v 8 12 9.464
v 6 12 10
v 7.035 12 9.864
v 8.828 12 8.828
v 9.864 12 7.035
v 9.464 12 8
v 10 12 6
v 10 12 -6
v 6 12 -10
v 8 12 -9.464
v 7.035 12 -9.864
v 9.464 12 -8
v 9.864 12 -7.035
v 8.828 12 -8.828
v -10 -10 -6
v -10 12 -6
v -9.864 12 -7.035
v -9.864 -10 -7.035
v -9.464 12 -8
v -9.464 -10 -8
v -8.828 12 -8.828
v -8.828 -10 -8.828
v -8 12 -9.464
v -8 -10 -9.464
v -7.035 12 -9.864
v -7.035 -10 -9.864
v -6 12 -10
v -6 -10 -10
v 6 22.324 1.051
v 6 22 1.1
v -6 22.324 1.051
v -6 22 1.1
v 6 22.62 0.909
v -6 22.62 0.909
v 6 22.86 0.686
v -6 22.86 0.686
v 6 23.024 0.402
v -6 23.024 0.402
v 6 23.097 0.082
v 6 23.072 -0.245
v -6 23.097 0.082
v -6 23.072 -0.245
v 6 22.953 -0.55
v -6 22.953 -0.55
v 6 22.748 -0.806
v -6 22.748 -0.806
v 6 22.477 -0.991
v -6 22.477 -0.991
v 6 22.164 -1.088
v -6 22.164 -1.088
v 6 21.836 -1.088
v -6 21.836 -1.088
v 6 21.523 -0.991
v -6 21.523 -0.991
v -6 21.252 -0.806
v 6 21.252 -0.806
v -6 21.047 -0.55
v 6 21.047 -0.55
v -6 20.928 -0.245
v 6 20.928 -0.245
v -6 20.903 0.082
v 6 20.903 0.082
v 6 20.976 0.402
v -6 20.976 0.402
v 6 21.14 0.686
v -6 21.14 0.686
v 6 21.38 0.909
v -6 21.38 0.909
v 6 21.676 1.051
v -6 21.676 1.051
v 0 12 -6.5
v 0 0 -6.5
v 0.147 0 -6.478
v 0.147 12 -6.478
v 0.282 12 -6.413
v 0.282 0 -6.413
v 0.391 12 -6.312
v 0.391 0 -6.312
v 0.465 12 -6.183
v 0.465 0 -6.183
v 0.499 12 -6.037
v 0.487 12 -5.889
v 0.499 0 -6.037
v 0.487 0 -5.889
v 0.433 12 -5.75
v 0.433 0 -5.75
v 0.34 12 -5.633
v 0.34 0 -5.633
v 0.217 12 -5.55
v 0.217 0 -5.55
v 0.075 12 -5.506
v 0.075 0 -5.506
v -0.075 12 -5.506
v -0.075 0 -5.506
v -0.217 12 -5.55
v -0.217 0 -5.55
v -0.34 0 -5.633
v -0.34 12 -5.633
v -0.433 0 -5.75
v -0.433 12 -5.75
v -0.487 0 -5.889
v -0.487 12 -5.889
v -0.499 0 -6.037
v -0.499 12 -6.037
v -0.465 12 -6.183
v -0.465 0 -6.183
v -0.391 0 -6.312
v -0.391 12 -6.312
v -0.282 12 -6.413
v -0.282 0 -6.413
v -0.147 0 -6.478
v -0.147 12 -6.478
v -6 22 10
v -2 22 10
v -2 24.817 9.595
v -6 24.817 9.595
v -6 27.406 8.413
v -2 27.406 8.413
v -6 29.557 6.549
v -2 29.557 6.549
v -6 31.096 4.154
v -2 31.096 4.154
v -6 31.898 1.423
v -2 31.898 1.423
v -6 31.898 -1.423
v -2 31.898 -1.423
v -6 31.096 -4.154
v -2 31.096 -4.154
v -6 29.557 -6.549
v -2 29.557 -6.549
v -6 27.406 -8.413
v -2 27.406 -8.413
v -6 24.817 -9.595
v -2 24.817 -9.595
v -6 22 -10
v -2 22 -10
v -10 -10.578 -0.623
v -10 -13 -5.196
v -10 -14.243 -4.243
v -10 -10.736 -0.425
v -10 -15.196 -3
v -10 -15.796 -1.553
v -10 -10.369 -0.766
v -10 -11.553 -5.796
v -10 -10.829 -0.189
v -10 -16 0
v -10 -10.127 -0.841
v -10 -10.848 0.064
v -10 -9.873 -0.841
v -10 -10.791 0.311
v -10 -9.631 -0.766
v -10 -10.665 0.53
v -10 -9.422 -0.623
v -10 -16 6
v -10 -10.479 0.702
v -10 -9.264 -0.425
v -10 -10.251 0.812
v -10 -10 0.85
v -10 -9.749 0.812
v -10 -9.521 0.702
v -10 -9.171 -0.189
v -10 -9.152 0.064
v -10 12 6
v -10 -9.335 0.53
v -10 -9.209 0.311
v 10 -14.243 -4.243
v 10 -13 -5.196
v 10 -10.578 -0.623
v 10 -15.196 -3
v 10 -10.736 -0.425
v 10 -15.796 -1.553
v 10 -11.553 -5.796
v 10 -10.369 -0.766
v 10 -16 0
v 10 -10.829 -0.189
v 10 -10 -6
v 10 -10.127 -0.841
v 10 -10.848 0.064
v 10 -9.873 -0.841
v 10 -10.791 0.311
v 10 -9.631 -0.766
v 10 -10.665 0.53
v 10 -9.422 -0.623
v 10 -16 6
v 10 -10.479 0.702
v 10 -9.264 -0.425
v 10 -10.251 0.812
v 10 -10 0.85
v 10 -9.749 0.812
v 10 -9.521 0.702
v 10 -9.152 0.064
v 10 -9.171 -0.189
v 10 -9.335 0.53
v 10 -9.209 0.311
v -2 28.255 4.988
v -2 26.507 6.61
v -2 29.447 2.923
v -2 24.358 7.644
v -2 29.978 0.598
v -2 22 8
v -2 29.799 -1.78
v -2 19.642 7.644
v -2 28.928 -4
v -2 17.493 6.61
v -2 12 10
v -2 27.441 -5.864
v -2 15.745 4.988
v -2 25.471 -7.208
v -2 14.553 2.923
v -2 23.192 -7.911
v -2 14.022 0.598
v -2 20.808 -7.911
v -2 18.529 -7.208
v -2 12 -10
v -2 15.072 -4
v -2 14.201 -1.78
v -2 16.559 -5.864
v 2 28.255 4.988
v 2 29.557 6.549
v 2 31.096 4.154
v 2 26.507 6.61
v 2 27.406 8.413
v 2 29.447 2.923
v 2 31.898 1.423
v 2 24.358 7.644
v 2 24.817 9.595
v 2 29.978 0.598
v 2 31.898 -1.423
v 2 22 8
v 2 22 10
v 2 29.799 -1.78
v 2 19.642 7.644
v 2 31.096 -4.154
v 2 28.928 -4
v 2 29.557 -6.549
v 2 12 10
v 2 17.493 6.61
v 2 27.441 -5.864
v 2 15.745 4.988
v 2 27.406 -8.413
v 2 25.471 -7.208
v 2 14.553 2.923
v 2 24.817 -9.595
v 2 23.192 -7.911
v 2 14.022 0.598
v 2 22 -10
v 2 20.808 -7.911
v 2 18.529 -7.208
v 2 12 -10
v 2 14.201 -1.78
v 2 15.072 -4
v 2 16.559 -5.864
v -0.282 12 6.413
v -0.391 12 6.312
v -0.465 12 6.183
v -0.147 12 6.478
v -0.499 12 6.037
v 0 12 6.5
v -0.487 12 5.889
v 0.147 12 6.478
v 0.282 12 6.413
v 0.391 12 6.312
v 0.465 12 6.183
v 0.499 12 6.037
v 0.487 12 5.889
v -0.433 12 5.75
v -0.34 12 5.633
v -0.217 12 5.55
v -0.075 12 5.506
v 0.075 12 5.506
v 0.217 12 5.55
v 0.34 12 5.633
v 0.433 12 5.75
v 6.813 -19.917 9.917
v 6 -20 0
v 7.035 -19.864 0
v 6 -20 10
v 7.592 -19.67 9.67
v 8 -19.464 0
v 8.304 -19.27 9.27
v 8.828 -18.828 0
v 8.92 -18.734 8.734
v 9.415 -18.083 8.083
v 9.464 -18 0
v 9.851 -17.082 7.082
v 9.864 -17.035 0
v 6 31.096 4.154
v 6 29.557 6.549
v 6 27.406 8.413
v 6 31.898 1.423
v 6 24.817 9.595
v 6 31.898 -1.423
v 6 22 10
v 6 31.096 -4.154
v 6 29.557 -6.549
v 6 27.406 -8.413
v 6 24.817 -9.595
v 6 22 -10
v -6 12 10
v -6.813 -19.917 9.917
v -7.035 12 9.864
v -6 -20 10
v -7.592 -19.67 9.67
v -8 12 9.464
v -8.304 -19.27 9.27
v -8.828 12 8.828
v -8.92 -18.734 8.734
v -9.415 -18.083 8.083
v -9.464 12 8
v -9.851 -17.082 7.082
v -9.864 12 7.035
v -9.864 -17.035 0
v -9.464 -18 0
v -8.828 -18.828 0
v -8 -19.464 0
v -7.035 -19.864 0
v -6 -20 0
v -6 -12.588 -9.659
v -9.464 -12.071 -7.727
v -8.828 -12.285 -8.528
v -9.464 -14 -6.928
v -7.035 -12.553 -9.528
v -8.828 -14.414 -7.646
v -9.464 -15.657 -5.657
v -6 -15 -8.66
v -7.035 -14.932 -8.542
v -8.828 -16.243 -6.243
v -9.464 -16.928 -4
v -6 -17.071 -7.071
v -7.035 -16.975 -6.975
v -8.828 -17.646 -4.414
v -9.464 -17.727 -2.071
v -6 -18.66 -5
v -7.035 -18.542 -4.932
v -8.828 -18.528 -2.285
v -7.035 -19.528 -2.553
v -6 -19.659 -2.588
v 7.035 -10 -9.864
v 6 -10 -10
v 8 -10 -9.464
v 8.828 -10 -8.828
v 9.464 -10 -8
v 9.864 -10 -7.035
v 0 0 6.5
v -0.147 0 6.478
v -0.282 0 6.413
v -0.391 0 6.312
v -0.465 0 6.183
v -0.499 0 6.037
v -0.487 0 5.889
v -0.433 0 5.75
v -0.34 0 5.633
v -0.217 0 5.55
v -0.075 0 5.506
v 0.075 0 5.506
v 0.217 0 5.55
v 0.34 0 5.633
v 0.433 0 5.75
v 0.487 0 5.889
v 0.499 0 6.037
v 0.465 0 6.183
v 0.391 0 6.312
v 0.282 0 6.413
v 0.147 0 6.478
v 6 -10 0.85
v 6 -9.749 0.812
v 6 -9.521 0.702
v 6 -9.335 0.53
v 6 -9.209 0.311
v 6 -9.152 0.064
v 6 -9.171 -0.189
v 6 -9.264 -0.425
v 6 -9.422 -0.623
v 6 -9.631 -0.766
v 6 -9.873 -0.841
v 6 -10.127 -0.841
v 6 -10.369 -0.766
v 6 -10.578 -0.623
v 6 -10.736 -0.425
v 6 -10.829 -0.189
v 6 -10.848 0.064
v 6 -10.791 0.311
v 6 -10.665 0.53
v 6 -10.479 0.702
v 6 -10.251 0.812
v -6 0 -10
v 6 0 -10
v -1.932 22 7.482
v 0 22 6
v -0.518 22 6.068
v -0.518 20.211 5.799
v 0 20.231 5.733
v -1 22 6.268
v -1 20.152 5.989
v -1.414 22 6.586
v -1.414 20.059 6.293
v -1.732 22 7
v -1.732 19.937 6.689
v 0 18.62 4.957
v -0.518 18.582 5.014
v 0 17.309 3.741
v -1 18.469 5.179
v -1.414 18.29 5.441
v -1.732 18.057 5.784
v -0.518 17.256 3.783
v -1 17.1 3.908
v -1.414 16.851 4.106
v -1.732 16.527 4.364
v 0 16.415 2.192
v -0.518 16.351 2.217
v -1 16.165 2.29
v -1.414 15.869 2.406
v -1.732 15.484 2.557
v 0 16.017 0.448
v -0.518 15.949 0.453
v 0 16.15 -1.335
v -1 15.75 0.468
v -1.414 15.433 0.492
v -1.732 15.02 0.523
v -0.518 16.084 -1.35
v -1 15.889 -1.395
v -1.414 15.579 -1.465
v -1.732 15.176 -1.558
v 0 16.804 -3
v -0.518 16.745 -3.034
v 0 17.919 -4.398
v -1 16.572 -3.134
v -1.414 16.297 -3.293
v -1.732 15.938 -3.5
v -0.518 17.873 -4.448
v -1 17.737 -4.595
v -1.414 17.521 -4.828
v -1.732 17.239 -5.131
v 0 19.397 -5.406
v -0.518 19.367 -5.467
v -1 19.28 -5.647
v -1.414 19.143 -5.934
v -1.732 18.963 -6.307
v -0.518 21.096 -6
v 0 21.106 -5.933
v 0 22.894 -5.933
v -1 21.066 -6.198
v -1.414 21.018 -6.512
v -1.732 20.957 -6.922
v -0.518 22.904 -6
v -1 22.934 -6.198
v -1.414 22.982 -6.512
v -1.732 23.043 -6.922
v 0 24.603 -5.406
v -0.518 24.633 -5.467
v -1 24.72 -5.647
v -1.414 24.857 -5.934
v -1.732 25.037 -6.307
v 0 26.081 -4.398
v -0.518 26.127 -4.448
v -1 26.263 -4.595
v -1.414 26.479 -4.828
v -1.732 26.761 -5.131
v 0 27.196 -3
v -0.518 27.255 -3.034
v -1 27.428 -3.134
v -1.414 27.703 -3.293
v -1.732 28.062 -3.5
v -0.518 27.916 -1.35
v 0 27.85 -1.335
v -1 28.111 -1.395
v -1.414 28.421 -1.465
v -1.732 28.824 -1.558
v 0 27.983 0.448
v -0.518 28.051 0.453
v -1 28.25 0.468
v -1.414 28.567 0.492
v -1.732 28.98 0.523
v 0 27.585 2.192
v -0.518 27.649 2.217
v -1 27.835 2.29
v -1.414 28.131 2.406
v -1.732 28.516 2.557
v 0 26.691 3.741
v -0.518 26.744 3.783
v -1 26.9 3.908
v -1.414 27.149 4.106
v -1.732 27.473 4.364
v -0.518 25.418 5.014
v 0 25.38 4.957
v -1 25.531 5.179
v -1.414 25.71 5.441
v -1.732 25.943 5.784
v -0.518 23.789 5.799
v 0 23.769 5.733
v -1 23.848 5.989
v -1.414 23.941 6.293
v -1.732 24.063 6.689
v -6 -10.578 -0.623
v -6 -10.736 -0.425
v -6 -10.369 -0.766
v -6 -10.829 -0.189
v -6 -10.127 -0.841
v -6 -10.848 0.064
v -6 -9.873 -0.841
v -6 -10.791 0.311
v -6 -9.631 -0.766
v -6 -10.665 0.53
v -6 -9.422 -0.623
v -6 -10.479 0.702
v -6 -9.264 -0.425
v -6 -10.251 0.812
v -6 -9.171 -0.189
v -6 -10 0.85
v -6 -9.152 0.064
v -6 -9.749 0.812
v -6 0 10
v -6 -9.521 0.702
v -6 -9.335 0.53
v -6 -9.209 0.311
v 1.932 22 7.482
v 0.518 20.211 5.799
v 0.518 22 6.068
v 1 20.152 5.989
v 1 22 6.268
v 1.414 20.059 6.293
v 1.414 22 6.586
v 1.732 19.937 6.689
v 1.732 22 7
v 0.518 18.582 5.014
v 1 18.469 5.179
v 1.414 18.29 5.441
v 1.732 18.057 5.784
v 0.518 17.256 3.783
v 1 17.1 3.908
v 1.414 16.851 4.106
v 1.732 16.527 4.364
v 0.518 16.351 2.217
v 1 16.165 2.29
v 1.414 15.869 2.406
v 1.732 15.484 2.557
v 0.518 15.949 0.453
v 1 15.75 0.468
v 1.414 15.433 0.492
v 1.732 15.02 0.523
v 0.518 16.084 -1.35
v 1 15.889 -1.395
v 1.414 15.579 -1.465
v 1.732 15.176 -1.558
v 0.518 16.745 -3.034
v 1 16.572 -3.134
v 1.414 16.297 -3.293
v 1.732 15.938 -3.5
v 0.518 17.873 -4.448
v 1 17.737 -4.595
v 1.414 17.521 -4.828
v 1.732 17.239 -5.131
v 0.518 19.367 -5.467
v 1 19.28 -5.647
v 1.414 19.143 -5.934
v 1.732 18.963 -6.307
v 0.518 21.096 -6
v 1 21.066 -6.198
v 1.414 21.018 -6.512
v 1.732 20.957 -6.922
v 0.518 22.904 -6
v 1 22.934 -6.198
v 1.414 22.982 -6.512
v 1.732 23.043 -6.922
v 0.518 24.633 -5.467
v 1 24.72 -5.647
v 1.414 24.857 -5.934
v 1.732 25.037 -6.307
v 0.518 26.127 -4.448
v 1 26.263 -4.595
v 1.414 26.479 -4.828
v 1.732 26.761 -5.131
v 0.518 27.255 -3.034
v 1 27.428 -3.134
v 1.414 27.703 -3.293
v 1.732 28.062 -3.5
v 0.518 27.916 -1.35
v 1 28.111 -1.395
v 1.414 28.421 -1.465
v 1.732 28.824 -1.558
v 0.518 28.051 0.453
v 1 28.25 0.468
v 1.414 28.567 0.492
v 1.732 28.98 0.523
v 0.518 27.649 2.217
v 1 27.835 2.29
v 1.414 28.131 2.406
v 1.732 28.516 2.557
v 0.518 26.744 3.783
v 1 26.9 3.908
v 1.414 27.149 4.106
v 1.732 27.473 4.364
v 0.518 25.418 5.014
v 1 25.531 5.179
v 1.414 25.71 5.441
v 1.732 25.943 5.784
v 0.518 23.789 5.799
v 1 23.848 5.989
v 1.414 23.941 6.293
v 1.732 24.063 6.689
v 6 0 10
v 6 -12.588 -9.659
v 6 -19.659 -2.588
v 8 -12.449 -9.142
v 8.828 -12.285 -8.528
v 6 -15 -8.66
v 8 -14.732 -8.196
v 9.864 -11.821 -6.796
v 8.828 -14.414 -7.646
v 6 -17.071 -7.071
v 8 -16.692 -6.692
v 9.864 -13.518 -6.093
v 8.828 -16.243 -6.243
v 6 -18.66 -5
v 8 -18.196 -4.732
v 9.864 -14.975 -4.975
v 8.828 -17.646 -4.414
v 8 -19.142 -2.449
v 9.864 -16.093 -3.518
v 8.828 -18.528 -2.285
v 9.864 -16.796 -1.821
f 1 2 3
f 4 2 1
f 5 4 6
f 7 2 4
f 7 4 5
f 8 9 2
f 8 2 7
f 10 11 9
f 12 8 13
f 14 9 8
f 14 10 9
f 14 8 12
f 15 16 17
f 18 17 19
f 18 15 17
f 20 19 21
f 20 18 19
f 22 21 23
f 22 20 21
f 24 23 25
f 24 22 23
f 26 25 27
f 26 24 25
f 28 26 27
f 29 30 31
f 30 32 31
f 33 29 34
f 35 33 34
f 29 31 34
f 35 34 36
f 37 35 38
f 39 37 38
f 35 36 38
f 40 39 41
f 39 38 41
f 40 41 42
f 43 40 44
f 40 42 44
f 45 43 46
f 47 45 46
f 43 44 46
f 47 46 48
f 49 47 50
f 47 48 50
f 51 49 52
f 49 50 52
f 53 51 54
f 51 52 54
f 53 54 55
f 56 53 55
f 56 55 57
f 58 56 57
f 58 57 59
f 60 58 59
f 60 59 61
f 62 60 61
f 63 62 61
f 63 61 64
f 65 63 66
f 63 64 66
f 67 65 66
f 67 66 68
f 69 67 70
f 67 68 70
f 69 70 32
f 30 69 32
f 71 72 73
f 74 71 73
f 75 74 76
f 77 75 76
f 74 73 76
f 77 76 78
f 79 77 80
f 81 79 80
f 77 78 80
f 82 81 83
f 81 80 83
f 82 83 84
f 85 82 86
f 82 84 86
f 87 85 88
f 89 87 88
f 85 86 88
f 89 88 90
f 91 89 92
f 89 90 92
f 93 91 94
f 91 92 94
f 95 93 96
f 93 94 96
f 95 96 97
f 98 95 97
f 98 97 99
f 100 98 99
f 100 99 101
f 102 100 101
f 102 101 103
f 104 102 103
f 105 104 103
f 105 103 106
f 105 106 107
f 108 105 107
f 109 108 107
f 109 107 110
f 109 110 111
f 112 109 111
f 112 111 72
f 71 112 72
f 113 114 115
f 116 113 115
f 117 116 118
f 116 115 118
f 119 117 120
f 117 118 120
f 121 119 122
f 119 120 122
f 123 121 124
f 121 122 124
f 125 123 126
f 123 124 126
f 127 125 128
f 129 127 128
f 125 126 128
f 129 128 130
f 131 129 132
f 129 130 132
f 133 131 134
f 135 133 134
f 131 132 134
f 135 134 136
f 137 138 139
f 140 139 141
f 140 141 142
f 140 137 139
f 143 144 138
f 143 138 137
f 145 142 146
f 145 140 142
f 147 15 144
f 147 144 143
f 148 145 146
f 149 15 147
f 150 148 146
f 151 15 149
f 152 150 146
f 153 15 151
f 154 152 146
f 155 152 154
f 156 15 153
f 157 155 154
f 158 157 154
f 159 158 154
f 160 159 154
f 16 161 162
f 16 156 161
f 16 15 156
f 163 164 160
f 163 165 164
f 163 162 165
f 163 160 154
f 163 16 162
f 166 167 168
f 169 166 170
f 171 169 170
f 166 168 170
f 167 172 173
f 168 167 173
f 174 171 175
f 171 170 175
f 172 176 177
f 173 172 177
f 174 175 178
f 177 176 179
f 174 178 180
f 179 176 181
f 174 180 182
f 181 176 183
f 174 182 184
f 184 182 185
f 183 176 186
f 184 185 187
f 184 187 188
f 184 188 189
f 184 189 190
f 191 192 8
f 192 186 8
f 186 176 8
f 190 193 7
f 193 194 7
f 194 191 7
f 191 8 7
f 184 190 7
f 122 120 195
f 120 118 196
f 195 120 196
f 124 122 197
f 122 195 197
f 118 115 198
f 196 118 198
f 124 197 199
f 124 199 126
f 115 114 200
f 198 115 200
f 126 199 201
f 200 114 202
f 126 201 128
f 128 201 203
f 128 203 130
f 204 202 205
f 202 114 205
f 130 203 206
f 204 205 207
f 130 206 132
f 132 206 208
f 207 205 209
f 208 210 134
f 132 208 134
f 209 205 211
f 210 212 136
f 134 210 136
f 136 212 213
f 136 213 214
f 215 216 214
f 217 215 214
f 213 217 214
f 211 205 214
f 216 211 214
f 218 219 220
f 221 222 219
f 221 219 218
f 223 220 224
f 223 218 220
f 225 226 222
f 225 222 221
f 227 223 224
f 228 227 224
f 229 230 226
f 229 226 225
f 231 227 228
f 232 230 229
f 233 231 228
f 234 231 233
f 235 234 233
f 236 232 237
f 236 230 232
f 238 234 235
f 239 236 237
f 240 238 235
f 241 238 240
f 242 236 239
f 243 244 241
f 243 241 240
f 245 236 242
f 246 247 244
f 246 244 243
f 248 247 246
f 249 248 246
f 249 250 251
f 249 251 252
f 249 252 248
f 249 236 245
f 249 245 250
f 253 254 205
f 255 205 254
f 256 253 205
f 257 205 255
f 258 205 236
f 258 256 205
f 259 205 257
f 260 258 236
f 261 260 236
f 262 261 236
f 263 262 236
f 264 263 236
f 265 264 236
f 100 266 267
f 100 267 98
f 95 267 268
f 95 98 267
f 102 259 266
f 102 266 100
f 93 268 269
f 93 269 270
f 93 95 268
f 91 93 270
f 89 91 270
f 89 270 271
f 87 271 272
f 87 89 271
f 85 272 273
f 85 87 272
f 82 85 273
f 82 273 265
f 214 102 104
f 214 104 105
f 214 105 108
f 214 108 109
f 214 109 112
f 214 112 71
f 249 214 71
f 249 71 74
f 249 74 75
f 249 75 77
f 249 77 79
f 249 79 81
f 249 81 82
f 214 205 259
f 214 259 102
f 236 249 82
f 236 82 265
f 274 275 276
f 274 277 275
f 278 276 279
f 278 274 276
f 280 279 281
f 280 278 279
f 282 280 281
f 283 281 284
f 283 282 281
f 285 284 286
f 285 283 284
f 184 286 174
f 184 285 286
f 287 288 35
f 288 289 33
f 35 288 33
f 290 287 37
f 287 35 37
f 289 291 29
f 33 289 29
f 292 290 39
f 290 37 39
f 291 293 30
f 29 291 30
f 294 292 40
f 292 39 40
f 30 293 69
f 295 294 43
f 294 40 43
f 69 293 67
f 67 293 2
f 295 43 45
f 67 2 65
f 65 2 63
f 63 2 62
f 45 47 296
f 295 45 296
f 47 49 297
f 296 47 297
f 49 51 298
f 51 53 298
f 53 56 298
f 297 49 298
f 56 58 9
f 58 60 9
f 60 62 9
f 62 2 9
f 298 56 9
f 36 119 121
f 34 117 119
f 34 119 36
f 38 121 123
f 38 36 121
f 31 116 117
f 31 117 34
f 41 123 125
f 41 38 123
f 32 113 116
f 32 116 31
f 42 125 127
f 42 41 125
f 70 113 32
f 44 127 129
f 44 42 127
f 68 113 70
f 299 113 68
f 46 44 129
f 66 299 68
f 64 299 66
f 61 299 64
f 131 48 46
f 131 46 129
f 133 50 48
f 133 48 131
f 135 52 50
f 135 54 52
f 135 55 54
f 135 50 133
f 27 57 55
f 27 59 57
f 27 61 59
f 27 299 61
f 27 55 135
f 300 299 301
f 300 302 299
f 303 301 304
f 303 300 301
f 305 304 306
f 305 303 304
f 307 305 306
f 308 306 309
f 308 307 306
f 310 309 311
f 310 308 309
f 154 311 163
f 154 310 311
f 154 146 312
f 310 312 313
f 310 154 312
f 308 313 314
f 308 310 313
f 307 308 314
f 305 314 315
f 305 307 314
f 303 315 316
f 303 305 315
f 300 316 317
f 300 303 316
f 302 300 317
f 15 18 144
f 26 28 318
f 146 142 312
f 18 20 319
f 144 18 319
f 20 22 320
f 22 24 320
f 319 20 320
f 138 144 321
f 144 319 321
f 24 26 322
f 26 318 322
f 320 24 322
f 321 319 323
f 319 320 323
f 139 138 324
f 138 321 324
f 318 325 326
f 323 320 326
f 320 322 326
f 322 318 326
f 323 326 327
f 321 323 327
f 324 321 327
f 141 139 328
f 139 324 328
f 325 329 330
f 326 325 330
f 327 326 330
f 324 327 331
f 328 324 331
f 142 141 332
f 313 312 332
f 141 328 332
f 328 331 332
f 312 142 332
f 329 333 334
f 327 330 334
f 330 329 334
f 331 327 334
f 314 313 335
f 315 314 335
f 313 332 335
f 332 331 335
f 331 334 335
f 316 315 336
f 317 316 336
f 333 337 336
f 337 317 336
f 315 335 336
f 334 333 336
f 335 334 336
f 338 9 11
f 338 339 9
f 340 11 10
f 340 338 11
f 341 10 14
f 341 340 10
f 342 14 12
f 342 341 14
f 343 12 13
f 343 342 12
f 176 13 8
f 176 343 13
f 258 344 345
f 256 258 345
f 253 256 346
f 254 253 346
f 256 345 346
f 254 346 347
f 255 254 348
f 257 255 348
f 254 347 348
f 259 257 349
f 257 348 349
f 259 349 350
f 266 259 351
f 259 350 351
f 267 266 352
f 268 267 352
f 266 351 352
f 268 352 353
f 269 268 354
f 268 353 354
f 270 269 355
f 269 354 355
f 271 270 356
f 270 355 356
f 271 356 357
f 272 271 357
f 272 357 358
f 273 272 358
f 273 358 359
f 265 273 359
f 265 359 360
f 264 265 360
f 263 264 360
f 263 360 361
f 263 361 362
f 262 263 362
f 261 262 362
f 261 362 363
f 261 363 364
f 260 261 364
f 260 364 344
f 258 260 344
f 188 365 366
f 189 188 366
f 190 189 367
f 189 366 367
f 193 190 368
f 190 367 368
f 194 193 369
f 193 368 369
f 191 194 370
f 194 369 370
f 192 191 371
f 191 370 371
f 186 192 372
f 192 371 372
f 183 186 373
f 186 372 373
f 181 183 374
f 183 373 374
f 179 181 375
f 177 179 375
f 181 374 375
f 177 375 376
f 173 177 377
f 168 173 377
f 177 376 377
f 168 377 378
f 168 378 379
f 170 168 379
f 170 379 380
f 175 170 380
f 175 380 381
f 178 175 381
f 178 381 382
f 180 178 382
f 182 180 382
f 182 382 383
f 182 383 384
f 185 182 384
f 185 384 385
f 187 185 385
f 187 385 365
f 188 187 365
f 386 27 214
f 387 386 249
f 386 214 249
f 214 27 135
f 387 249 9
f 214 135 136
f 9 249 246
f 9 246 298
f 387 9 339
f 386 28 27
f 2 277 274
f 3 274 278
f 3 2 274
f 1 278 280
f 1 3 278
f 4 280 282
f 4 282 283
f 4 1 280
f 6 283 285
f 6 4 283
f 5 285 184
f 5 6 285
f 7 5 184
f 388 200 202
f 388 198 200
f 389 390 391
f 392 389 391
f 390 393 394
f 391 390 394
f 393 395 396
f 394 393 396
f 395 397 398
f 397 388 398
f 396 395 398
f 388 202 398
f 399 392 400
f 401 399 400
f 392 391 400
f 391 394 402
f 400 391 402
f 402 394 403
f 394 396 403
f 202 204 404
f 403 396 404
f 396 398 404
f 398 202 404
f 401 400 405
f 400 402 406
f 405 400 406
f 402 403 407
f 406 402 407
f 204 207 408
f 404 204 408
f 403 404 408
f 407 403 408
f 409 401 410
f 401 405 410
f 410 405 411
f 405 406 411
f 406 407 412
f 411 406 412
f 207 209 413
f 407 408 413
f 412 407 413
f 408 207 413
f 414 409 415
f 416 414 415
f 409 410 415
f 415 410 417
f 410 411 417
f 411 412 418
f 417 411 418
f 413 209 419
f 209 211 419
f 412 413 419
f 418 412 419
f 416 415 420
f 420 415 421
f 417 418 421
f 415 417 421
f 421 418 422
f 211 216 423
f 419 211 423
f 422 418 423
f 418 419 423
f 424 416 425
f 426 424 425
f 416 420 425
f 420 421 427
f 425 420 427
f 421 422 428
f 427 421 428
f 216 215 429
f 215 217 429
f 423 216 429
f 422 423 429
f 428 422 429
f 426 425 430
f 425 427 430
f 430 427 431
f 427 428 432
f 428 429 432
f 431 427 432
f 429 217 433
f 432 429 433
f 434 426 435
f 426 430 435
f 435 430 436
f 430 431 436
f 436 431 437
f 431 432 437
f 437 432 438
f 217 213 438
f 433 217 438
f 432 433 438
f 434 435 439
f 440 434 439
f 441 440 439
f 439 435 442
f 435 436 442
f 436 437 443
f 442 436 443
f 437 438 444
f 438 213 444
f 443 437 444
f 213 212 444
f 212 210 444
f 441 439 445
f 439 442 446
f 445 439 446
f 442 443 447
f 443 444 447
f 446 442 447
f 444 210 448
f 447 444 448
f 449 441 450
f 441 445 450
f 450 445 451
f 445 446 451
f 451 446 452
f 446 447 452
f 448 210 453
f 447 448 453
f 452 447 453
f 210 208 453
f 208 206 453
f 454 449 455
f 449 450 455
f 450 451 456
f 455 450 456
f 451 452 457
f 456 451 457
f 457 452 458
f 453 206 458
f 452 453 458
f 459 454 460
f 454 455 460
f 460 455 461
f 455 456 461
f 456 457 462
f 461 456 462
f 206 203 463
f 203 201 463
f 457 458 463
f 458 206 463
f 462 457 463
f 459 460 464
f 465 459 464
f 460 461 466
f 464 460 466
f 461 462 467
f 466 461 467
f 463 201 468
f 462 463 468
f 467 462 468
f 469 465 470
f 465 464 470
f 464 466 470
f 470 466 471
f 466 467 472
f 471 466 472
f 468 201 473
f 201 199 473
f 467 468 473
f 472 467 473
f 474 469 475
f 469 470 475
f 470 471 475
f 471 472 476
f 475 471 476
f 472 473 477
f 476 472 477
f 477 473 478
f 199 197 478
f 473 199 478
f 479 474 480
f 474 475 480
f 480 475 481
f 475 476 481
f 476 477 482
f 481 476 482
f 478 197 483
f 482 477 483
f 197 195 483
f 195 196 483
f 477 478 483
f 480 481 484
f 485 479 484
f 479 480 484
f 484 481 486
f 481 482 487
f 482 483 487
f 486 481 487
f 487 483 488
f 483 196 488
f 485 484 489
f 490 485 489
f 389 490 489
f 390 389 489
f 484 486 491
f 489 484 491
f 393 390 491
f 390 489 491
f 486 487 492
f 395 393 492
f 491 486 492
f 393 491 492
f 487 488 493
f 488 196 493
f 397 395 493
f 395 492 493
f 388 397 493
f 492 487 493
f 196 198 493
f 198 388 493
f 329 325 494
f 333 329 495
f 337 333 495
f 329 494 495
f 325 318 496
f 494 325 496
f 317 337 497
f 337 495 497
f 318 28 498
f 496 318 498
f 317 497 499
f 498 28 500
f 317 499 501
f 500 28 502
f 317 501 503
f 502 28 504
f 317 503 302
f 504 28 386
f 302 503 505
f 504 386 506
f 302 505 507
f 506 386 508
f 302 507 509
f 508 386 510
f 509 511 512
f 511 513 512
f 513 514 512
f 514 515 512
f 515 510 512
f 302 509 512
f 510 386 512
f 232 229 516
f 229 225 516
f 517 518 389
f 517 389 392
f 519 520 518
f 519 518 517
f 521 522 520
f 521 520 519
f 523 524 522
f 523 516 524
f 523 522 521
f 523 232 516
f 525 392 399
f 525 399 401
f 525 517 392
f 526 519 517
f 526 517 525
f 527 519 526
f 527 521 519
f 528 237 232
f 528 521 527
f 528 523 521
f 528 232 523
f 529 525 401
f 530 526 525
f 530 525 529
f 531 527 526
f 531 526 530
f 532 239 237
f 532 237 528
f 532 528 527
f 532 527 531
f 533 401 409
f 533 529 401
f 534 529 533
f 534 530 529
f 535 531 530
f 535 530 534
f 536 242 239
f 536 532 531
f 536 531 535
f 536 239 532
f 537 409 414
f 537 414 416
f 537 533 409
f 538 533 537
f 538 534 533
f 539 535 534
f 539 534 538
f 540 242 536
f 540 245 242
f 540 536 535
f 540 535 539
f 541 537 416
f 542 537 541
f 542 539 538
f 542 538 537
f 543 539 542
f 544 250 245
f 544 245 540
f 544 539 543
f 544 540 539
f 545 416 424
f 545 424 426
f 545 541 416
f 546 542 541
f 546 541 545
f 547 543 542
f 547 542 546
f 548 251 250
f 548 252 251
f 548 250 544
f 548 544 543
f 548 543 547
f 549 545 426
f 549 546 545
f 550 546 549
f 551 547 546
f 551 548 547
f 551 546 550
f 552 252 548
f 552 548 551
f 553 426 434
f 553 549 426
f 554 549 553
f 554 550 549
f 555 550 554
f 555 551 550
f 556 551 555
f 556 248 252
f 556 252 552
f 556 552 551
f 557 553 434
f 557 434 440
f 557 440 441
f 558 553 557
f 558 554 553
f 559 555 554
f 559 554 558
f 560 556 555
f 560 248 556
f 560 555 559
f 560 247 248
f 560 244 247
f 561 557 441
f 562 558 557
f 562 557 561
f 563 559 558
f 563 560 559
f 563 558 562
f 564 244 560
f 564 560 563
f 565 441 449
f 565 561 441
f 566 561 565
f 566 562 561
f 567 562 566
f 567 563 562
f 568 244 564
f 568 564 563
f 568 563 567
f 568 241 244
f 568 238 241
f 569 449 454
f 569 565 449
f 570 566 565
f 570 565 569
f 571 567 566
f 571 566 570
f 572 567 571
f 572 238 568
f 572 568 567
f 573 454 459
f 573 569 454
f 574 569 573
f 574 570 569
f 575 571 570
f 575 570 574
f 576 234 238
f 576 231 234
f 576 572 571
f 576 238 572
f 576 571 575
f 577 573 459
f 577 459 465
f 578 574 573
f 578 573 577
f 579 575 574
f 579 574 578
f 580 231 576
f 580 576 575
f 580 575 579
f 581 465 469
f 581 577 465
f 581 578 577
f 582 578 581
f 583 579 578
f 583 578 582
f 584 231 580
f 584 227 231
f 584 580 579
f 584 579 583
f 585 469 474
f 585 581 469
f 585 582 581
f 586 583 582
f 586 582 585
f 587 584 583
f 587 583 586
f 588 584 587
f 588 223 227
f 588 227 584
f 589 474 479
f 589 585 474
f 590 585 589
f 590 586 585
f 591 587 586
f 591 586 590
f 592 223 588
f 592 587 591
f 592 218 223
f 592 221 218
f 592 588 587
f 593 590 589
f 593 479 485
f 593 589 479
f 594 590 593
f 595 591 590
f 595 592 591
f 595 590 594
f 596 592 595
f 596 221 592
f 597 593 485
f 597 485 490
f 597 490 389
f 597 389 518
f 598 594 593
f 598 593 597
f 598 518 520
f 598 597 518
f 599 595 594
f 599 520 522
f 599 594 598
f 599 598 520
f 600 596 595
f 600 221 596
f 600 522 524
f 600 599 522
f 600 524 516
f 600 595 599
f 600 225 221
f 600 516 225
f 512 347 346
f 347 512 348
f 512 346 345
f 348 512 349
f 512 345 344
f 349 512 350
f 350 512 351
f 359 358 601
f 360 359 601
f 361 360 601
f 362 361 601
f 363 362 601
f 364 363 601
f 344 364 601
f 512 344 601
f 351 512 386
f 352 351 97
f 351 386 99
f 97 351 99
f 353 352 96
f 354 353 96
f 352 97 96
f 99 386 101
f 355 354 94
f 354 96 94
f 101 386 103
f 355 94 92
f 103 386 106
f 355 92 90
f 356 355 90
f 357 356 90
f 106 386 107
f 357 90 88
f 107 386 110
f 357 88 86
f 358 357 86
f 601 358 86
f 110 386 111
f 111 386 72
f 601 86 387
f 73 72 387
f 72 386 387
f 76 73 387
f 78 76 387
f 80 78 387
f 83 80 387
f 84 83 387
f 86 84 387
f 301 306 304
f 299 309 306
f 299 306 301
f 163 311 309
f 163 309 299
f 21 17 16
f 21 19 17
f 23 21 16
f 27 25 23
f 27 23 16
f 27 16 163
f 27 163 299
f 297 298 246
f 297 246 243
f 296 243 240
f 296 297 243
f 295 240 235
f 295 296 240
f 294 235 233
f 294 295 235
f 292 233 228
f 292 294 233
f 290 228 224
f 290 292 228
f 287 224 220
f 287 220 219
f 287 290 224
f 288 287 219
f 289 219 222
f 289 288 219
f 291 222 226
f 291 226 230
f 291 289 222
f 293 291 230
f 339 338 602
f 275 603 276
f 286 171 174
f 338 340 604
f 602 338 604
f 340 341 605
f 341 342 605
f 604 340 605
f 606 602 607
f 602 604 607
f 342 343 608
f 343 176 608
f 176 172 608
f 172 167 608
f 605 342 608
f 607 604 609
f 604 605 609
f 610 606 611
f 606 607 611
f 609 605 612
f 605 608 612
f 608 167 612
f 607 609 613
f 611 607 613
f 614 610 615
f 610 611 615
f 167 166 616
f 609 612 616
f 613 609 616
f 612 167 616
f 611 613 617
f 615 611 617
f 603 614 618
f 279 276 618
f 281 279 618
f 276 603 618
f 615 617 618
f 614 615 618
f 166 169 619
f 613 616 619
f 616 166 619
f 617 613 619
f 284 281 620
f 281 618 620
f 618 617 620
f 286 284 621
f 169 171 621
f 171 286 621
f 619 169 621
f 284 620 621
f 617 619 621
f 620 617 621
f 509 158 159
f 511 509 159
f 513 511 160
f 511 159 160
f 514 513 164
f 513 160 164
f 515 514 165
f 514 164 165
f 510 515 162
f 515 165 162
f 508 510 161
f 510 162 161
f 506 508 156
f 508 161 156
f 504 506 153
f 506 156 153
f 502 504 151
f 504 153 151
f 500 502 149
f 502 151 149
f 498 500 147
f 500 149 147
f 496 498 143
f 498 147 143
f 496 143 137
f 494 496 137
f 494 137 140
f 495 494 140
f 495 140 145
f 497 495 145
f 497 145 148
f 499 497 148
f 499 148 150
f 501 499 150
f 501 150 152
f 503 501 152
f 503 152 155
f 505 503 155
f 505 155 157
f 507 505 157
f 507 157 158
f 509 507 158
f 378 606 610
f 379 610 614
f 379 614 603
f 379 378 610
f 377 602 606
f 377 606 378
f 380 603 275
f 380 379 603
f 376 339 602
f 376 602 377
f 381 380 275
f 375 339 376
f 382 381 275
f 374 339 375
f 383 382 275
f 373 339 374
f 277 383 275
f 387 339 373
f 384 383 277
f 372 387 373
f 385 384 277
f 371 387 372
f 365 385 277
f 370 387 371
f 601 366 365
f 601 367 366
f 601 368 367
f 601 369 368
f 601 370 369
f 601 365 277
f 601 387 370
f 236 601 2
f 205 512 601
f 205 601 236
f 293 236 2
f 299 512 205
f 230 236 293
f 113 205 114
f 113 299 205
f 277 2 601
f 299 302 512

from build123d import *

# Parameters (mm, degrees)
SKETCH1_W           = 20
SKETCH1_H           = 20
BOSS_EXTRUDE1_DEPTH = 12
SKETCH4_W           = 4
SKETCH4_H           = 20
BOSS_EXTRUDE2_DEPTH = 10
BOSS_EXTRUDE3_DEPTH = 4
BOSS_EXTRUDE4_START = -4
BOSS_EXTRUDE4_DEPTH = 4
SKETCH7_R           = 0.85
CUT_EXTRUDE1_DEPTH  = 31
FILLET1_R           = 4
SKETCH8_W           = 4
SKETCH8_H           = 20
BOSS_EXTRUDE5_DEPTH = 10
SKETCH9_R           = 10
BOSS_EXTRUDE6_DEPTH = 4
BOSS_EXTRUDE7_START = -4
SKETCH10_R          = 10
BOSS_EXTRUDE7_DEPTH = 4
SKETCH12_R          = 1.1
CUT_EXTRUDE2_DEPTH  = 38.148351242
SKETCH13_R          = 6
BOSS_EXTRUDE8_DEPTH = 4
SKETCH14_R          = 1.1
CUT_EXTRUDE3_DEPTH  = 4
FILLET2_R           = 2
CUT_EXTRUDE4_REACH  = 36.986
SKETCH16_R          = 0.5


with BuildPart() as part:
    # Sketch1 → Boss-Extrude1 (new body)
    with BuildSketch(Plane(origin=(0, 0, 0), x_dir=(1, 0, 0), z_dir=(0, 1, 0))):
        Rectangle(SKETCH1_W, SKETCH1_H)
    extrude(amount=BOSS_EXTRUDE1_DEPTH)

    # Sketch4 → Boss-Extrude2 (add)
    with BuildSketch(Plane.XZ):
        with Locations((-8, 0)):
            Rectangle(SKETCH4_W, SKETCH4_H)
        with Locations((8, 0)):
            Rectangle(SKETCH4_W, SKETCH4_H)
    extrude(amount=BOSS_EXTRUDE2_DEPTH)

    # Sketch5 → Boss-Extrude3 (add)
    with BuildSketch(Plane.ZY.offset(10)):
        with BuildLine():
            Line((0, -20), (10, -20))
            Line((10, -20), (10, -10))
            ThreePointArc((10, -10), (-7.071067812, -2.928932188), (0, -20))
        make_face()
    extrude(amount=-BOSS_EXTRUDE3_DEPTH)

    # Sketch6 → Boss-Extrude4 (add)
    with BuildSketch(Plane(origin=(10, 0, 0), x_dir=(0, 0, -1), z_dir=(1, 0, 0)).offset(BOSS_EXTRUDE4_START)):
        with BuildLine():
            Line((0, -20), (-10, -20))
            Line((-10, -20), (-10, -10))
            ThreePointArc((-10, -10), (7.071067812, -2.928932188), (0, -20))
        make_face()
    extrude(amount=BOSS_EXTRUDE4_DEPTH)

    # Sketch7 → Cut-Extrude1 (cut, through all)
    with BuildSketch(Plane.ZY.offset(10)):
        with Locations((0, -10)):
            Circle(SKETCH7_R)
    extrude(amount=-CUT_EXTRUDE1_DEPTH, mode=Mode.SUBTRACT)

    # Fillet1
    fillet1_edges = [part.edges().sort_by_distance(p)[0] for p in [
        (-10, -4, 10),
        (-10, -17.071067812, -7.071067812),
        (10, -4, 10),
        (10, -17.071067812, -7.071067812),
        (-10, 1, -10),
        (10, 1, -10),
        (10, -20, 5),
        (-10, -20, 5),
    ]]
    fillet(fillet1_edges, radius=FILLET1_R - 0.0001)  # a hair under: the kernel refuses the full size

    # Sketch8 → Boss-Extrude5 (add)
    with BuildSketch(Plane(origin=(0, 12, 0), x_dir=(1, 0, 0), z_dir=(0, 1, 0))):
        with Locations((4, 0)):
            Rectangle(SKETCH8_W, SKETCH8_H)
        with Locations((-4, 0)):
            Rectangle(SKETCH8_W, SKETCH8_H)
    extrude(amount=BOSS_EXTRUDE5_DEPTH)

    # Sketch9 → Boss-Extrude6 (add)
    with BuildSketch(Plane(origin=(6, 0, 0), x_dir=(0, 0, -1), z_dir=(1, 0, 0))):
        with Locations((0, 22)):
            Circle(SKETCH9_R)
    extrude(amount=-BOSS_EXTRUDE6_DEPTH)

    # Sketch10 → Boss-Extrude7 (add)
    with BuildSketch(Plane.ZY.offset(6).offset(BOSS_EXTRUDE7_START)):
        with Locations((0, 22)):
            Circle(SKETCH10_R)
    extrude(amount=BOSS_EXTRUDE7_DEPTH)

    # Sketch12 → Cut-Extrude2 (cut, through all)
    with BuildSketch(Plane.ZY.offset(6)):
        with Locations((0, 22)):
            Circle(SKETCH12_R)
    extrude(amount=-CUT_EXTRUDE2_DEPTH, mode=Mode.SUBTRACT)

    # Sketch13 → Boss-Extrude8 (add)
    with BuildSketch(Plane(origin=(-2, 0, 0), x_dir=(0, 0, -1), z_dir=(1, 0, 0))):
        with Locations(Location((0, 22, 0), (0, 0, 180))):
            Circle(SKETCH13_R)
    extrude(amount=BOSS_EXTRUDE8_DEPTH)

    # Sketch14 → Cut-Extrude3 (cut)
    with BuildSketch(Plane(origin=(-2, 0, 0), x_dir=(0, 0, -1), z_dir=(1, 0, 0))):
        with Locations(Location((0, 22, 0), (0, 0, 180))):
            Circle(SKETCH14_R)
    extrude(amount=CUT_EXTRUDE3_DEPTH, mode=Mode.SUBTRACT)

    # Fillet2
    fillet2_edges = [part.edges().sort_by_distance(p)[0] for p in [
        (-2, 22, -6),
        (2, 22, -6),
    ]]
    fillet(fillet2_edges, radius=FILLET2_R - 0.0001)  # a hair under: the kernel refuses the full size

    # Sketch16 → Cut-Extrude4 (cut, up to next)
    with BuildSketch(Plane.XZ, mode=Mode.PRIVATE) as cut_extrude4_sk1:
        with Locations(Location((0, -6, 0), (0, 0, 270))):
            Circle(SKETCH16_R)
    cut_extrude4_tool1 = extrude(cut_extrude4_sk1.sketch, amount=-CUT_EXTRUDE4_REACH, mode=Mode.PRIVATE) & part.part
    # Sketch16 → Cut-Extrude4 (cut, up to next)
    with BuildSketch(Plane.XZ, mode=Mode.PRIVATE) as cut_extrude4_sk2:
        with Locations(Location((0, 6, 0), (0, 0, 90))):
            Circle(SKETCH16_R)
    cut_extrude4_tool2 = extrude(cut_extrude4_sk2.sketch, amount=-CUT_EXTRUDE4_REACH, mode=Mode.PRIVATE) & part.part
    add(cut_extrude4_tool1.solids().sort_by_distance((0, 0, -6))[0], mode=Mode.SUBTRACT)
    add(cut_extrude4_tool2.solids().sort_by_distance((0, 0, 6))[0], mode=Mode.SUBTRACT)


solid = part.part
